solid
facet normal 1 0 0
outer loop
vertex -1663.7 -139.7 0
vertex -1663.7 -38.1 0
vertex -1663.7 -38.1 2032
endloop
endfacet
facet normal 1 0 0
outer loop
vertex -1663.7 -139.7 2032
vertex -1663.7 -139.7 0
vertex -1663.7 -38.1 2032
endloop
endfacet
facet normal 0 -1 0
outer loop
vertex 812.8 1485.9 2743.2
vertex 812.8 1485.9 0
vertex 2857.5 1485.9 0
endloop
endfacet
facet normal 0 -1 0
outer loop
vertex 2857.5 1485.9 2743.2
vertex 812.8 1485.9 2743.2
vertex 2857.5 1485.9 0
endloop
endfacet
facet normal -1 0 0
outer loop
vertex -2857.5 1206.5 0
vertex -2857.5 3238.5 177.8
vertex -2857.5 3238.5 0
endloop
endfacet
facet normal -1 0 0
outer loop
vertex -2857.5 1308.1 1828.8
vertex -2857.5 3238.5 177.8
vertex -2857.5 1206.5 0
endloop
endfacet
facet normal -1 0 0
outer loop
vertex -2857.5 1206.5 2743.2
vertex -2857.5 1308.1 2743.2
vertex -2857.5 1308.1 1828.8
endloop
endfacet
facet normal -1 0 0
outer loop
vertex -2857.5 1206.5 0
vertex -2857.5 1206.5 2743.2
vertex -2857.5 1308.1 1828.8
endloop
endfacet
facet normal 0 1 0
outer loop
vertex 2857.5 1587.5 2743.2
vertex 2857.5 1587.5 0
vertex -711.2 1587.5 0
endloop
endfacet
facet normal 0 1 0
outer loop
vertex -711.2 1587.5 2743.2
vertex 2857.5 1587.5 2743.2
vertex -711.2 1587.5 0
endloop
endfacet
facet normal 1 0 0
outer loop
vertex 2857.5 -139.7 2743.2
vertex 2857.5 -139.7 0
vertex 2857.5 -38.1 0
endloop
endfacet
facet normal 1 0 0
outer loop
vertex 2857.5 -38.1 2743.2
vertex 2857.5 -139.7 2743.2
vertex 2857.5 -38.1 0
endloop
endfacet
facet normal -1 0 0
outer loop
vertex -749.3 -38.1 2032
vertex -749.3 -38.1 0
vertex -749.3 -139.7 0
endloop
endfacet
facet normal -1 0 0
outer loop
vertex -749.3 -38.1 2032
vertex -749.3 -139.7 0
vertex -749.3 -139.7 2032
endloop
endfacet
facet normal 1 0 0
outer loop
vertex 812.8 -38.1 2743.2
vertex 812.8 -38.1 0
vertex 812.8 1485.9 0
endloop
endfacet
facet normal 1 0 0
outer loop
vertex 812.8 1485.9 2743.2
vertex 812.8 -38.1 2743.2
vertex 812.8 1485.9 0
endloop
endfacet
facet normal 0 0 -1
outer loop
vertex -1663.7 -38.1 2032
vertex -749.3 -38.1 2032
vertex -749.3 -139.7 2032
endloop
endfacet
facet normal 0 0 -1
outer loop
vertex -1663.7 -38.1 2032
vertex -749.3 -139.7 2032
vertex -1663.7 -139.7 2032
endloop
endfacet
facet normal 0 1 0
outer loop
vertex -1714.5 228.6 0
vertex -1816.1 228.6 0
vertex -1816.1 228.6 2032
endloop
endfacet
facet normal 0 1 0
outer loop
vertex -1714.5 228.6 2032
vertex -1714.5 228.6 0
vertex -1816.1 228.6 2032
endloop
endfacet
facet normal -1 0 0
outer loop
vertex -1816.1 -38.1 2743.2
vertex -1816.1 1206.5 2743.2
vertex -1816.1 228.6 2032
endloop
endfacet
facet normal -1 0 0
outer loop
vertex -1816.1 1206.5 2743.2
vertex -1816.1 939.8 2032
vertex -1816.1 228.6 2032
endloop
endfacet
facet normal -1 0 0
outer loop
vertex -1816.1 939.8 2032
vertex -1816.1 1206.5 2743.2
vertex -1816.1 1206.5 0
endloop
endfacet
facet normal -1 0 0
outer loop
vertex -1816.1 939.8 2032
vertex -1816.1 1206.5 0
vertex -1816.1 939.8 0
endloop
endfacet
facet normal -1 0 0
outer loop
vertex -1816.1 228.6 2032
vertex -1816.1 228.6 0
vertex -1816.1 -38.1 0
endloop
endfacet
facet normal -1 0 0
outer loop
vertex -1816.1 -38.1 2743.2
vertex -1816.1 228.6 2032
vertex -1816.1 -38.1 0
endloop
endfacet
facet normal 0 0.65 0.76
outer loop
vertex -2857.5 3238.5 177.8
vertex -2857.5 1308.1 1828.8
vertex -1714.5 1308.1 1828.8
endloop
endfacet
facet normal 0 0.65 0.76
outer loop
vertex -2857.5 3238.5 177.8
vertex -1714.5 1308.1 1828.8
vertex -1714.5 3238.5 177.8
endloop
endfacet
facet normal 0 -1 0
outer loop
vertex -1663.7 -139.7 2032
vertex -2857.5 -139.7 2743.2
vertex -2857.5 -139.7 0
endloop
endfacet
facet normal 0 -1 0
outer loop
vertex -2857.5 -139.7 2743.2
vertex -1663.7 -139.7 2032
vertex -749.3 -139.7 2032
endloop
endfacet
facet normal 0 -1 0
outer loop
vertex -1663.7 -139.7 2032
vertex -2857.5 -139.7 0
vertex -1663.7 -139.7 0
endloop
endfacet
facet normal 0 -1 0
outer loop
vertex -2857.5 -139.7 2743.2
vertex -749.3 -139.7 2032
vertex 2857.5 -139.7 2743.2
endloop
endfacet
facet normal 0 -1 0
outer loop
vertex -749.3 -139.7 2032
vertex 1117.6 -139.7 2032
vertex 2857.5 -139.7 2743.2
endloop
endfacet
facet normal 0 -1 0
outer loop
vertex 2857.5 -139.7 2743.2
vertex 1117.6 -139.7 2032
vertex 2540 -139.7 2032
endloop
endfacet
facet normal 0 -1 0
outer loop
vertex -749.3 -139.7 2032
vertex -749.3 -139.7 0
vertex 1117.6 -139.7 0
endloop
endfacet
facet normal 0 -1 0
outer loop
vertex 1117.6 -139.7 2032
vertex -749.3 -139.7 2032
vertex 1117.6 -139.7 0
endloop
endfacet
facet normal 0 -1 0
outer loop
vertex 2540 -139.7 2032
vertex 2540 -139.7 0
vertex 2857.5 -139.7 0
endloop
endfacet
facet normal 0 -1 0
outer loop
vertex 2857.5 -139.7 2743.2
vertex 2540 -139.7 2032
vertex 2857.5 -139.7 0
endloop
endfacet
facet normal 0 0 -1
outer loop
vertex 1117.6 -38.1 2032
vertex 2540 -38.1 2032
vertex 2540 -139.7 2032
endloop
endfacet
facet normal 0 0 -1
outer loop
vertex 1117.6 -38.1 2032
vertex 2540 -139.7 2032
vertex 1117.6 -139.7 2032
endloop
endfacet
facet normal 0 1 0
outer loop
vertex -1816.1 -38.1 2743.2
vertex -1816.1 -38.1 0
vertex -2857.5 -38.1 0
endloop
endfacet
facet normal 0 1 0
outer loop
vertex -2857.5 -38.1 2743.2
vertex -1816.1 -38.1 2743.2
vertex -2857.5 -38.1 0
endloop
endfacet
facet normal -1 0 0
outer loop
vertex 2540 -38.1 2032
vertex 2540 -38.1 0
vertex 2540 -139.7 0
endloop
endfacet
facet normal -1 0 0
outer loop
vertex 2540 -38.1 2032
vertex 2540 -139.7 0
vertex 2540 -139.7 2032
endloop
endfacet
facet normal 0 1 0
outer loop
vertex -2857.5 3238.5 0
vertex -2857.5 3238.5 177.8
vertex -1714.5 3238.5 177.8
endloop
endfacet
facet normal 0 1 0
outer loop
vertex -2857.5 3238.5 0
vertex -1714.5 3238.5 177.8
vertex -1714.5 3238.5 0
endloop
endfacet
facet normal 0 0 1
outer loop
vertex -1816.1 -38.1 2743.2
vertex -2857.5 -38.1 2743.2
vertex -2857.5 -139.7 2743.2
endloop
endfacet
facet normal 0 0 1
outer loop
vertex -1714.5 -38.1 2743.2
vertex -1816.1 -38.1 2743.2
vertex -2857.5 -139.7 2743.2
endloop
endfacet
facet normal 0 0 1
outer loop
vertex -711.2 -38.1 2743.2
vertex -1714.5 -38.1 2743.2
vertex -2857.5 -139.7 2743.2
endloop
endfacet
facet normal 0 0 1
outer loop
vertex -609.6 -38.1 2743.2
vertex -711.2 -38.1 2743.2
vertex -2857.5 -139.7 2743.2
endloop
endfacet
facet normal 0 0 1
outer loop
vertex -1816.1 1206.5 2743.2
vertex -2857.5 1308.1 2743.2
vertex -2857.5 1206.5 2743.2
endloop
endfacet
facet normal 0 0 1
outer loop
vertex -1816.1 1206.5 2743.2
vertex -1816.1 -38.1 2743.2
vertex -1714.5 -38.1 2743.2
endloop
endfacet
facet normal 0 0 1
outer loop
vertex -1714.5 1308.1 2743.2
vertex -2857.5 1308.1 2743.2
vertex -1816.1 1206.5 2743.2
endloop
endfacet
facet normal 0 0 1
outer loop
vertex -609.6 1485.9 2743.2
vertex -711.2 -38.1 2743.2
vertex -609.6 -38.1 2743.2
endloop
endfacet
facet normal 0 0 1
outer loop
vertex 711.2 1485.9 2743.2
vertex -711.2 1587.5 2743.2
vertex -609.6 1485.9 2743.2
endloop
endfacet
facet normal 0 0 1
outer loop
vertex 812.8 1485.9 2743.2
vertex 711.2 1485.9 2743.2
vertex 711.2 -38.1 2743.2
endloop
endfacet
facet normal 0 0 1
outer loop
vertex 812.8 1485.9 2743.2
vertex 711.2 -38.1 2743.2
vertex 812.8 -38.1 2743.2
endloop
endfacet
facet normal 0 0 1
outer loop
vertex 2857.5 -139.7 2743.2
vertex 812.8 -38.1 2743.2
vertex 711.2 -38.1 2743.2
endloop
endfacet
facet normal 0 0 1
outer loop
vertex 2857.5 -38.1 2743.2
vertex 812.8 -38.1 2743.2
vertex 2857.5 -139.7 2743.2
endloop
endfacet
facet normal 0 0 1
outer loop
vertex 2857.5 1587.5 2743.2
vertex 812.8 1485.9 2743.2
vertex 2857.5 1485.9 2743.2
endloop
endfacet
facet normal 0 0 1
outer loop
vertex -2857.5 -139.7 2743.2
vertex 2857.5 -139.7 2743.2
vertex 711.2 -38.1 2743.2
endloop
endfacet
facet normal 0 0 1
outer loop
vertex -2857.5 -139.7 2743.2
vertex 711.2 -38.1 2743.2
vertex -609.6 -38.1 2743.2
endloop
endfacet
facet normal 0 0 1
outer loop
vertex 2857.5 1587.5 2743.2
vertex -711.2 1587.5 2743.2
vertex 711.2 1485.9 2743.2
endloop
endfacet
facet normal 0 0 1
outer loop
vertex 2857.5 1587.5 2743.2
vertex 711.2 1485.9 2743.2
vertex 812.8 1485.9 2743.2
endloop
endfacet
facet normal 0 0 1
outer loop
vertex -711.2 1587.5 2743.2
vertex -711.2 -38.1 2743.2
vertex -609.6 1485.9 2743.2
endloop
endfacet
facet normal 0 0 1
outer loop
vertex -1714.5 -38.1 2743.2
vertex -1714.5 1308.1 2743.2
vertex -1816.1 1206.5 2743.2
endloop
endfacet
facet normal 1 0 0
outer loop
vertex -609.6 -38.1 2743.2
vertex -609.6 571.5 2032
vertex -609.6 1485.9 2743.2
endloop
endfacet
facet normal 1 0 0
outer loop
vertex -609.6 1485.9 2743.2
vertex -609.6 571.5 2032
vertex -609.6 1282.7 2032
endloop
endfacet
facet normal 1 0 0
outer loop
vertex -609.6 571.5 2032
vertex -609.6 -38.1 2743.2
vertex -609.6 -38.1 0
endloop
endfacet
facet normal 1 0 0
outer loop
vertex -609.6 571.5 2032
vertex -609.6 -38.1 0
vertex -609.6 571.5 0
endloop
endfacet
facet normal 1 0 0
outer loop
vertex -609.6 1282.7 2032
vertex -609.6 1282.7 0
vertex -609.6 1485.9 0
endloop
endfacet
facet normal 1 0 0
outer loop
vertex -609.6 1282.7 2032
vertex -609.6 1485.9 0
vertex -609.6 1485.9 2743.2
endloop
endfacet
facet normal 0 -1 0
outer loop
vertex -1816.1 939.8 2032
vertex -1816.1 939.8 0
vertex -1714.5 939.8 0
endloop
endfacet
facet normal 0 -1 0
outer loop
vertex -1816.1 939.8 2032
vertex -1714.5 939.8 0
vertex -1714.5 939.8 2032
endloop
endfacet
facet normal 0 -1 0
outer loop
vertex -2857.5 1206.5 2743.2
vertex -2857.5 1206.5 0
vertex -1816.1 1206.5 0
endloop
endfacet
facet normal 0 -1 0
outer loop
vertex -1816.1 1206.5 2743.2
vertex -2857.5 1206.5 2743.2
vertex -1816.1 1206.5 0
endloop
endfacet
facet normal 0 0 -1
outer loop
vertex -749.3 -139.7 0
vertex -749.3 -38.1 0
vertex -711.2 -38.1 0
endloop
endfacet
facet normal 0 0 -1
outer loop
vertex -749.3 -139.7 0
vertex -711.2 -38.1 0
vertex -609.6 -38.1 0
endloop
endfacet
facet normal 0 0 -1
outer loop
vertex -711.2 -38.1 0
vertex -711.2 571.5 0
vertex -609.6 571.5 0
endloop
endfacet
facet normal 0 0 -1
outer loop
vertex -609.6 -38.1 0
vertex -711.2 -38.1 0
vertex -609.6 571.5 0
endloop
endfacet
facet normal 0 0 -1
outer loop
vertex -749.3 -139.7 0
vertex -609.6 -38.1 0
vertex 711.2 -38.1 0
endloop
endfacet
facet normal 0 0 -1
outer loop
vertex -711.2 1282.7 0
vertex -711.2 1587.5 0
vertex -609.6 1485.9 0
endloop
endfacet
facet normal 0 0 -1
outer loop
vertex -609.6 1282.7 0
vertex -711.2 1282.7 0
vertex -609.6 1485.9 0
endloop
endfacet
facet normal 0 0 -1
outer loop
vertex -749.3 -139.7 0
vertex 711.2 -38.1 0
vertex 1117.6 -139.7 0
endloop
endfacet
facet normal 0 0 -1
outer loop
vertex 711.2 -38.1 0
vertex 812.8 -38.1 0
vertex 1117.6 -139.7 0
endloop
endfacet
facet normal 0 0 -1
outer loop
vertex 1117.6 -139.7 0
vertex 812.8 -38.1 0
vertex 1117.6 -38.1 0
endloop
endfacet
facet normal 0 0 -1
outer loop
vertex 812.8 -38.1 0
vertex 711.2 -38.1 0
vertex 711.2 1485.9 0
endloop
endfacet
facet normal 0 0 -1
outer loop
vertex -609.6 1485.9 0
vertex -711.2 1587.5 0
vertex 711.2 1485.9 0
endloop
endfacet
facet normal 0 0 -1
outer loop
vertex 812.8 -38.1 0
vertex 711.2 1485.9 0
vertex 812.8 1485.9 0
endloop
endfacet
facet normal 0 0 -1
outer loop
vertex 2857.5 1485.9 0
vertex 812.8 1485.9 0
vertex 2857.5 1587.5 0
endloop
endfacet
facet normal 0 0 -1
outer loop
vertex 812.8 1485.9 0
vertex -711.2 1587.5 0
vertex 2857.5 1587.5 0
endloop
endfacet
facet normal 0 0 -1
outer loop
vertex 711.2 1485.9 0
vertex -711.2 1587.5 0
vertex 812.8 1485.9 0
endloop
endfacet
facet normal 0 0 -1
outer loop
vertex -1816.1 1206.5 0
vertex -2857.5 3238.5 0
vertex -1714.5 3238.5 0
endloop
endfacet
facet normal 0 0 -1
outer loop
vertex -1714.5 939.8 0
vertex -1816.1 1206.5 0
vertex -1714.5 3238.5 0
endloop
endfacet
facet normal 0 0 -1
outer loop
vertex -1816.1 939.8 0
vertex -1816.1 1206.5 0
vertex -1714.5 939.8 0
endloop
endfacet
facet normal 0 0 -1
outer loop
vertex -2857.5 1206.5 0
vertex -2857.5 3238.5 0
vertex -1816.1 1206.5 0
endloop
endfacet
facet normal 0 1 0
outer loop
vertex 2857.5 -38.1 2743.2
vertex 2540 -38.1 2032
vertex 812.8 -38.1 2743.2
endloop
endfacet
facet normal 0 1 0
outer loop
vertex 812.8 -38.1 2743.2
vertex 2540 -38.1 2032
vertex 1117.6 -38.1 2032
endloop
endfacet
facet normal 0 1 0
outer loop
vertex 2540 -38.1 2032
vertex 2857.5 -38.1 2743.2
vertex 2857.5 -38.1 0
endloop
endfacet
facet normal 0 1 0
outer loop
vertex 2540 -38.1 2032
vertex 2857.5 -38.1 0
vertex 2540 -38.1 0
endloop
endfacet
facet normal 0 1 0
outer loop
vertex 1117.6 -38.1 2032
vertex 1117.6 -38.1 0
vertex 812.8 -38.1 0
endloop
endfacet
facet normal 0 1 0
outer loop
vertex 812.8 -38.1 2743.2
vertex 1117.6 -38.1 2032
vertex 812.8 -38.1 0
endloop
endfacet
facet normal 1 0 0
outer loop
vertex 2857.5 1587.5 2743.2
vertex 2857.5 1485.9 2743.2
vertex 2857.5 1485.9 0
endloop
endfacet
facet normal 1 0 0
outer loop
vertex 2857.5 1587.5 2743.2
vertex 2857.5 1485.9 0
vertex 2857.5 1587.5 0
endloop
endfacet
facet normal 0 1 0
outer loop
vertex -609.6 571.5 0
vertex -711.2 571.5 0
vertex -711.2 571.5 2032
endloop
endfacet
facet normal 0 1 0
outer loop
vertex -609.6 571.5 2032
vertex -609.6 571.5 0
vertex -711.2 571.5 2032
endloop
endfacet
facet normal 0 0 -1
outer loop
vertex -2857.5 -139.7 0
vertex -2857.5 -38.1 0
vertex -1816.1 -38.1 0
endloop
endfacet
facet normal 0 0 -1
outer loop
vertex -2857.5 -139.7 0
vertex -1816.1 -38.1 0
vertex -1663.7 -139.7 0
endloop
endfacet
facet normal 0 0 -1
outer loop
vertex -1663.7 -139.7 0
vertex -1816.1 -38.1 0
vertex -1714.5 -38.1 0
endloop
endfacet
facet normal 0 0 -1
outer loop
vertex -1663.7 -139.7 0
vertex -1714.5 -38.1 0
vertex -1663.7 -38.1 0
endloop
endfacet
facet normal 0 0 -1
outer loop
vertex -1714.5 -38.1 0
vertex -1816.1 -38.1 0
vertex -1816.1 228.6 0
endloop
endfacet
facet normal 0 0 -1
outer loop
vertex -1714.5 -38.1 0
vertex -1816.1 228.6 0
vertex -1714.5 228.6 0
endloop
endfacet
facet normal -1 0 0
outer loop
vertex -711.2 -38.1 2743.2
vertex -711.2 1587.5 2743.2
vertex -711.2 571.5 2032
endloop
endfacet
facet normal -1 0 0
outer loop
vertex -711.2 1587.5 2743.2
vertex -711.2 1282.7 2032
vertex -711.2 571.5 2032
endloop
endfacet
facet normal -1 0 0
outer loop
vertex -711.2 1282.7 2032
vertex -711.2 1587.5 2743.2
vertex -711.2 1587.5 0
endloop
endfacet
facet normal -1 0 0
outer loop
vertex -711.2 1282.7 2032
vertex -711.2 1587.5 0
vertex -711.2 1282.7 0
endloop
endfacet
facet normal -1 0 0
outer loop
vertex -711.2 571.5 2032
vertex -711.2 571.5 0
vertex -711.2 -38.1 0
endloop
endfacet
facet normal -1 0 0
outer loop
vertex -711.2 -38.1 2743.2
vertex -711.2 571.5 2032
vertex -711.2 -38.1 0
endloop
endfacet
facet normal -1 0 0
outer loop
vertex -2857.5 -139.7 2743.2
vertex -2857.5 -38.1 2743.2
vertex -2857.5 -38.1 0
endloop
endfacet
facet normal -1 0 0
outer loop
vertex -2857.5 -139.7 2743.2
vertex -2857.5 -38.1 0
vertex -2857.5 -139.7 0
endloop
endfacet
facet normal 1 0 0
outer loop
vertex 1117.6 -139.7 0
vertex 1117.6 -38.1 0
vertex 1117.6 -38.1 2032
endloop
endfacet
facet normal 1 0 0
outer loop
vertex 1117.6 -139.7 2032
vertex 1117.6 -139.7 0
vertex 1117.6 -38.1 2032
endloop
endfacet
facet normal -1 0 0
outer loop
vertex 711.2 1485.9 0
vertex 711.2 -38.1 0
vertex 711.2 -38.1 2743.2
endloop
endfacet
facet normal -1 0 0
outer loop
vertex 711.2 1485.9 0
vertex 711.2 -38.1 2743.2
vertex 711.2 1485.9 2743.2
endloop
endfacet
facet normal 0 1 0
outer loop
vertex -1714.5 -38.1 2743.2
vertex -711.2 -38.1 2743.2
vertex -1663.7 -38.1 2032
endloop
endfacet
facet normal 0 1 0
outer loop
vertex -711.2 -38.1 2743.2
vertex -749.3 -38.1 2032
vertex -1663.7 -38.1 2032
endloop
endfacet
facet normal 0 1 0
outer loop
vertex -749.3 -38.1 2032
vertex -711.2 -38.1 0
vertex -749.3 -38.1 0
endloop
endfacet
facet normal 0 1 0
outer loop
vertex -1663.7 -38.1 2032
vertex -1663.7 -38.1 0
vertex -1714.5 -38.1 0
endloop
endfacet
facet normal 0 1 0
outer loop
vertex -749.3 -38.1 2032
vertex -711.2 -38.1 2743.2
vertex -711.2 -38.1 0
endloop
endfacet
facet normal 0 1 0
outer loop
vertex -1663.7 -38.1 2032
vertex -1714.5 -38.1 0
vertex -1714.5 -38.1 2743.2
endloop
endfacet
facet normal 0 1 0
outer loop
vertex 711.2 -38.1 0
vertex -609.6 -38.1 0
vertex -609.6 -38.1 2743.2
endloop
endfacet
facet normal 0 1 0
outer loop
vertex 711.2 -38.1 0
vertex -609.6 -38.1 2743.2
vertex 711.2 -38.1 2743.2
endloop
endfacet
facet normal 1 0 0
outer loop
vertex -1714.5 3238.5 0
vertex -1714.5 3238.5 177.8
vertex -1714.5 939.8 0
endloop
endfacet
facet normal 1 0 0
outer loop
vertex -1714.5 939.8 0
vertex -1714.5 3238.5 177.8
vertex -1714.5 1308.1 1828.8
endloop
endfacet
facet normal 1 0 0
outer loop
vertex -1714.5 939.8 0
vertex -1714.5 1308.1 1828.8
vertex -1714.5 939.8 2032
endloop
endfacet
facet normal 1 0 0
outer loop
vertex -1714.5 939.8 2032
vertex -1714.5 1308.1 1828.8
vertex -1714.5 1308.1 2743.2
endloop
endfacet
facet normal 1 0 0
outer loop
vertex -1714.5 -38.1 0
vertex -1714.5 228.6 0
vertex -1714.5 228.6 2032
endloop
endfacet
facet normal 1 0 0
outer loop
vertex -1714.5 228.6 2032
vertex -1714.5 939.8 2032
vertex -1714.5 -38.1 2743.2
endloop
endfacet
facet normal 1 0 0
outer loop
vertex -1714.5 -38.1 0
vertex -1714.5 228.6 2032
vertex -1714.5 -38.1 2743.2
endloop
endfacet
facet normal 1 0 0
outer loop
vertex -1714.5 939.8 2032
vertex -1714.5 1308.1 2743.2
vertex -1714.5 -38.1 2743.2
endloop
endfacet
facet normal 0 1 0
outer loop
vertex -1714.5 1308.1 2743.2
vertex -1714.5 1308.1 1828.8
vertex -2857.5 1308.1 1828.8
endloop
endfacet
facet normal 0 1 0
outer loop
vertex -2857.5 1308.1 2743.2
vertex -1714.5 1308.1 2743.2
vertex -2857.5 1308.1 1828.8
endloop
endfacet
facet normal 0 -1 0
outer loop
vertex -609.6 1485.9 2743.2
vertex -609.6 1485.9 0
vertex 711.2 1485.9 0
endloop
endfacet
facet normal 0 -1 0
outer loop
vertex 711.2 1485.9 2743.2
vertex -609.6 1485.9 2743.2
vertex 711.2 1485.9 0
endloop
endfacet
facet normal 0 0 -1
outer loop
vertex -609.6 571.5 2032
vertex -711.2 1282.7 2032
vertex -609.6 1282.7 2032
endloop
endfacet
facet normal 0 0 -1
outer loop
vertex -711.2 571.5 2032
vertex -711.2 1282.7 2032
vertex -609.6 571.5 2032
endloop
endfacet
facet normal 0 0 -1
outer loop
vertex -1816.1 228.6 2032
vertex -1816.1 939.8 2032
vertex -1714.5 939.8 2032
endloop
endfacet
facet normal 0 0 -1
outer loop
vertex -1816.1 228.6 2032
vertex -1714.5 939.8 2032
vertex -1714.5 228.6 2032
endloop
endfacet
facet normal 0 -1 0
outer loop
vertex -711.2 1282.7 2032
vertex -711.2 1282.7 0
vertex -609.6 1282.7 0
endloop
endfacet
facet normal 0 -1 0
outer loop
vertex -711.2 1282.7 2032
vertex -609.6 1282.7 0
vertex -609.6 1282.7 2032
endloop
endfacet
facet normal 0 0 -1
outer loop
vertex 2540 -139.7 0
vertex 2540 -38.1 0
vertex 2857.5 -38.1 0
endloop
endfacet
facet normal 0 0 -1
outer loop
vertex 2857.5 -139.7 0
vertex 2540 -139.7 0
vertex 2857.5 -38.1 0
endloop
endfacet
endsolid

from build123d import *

# Parameters (mm, degrees)
F0_W      = 1320.8
F0_H      = 1524
F1_DEPTH  = 2743.2
F2_W      = 1422.4
F2_H      = 2032
F3_DEPTH  = 101.6
F4_W      = 711.2
F4_H      = 2032
F5_DEPTH  = 101.6
F6_W      = 914.4
F6_H      = 2032
F7_DEPTH  = 101.6
F8_W      = 711.2
F8_H      = 2032
F9_DEPTH  = 101.6
F11_DEPTH = 1143


with BuildPart() as f1:
    # F0 (on Top) → F1 (new body)
    with BuildSketch(Plane.XY):
        Polygon((-1714.5, 1308.1), (-2857.5, 1308.1), (-2857.5, 1206.5), (-1816.1, 1206.5), (-1816.1, -38.1), (-2857.5, -38.1), (-2857.5, -139.7), (2857.5, -139.7), (2857.5, -38.1), (812.8, -38.1), (812.8, 1485.9), (2857.5, 1485.9), (2857.5, 1587.5), (-711.2, 1587.5), (-711.2, -38.1), (-1714.5, -38.1), align=None)
        with Locations((50.8, 723.9)):
            Rectangle(F0_W, F0_H, mode=Mode.SUBTRACT)
    extrude(amount=F1_DEPTH)

    # F2 (on face) → F3 (cut)
    with BuildSketch(Plane(origin=(0, -38.1, 0), x_dir=(-1, 0, 0), z_dir=(0, 1, 0))):
        with Locations((-1828.8, 1016)):
            Rectangle(F2_W, F2_H)
    extrude(amount=-F3_DEPTH, mode=Mode.SUBTRACT)

    # F4 (on face) → F5 (cut)
    with BuildSketch(Plane(origin=(-711.2, 0, 0), x_dir=(0, -1, 0), z_dir=(-1, 0, 0))):
        with Locations((-927.1, 1016)):
            Rectangle(F4_W, F4_H)
    extrude(amount=-F5_DEPTH, mode=Mode.SUBTRACT)

    # F6 (on face) → F7 (cut)
    with BuildSketch(Plane(origin=(0, -38.1, 0), x_dir=(-1, 0, 0), z_dir=(0, 1, 0))):
        with Locations((1206.5, 1016)):
            Rectangle(F6_W, F6_H)
    extrude(amount=-F7_DEPTH, mode=Mode.SUBTRACT)

    # F8 (on face) → F9 (cut)
    with BuildSketch(Plane(origin=(-1816.1, 0, 0), x_dir=(0, -1, 0), z_dir=(-1, 0, 0))):
        with Locations((-584.2, 1016)):
            Rectangle(F8_W, F8_H)
    extrude(amount=-F9_DEPTH, mode=Mode.SUBTRACT)

    # F10 (on face) → F11 (join, through all)
    with BuildSketch(Plane(origin=(-2857.5, 0, 0), x_dir=(0, -1, 0), z_dir=(-1, 0, 0))):
        Polygon((-3238.5, 0), (-1308.1, 0), (-1308.1, 1828.8), (-3238.5, 177.8), align=None)
    extrude(amount=-F11_DEPTH)


solid = f1.part
